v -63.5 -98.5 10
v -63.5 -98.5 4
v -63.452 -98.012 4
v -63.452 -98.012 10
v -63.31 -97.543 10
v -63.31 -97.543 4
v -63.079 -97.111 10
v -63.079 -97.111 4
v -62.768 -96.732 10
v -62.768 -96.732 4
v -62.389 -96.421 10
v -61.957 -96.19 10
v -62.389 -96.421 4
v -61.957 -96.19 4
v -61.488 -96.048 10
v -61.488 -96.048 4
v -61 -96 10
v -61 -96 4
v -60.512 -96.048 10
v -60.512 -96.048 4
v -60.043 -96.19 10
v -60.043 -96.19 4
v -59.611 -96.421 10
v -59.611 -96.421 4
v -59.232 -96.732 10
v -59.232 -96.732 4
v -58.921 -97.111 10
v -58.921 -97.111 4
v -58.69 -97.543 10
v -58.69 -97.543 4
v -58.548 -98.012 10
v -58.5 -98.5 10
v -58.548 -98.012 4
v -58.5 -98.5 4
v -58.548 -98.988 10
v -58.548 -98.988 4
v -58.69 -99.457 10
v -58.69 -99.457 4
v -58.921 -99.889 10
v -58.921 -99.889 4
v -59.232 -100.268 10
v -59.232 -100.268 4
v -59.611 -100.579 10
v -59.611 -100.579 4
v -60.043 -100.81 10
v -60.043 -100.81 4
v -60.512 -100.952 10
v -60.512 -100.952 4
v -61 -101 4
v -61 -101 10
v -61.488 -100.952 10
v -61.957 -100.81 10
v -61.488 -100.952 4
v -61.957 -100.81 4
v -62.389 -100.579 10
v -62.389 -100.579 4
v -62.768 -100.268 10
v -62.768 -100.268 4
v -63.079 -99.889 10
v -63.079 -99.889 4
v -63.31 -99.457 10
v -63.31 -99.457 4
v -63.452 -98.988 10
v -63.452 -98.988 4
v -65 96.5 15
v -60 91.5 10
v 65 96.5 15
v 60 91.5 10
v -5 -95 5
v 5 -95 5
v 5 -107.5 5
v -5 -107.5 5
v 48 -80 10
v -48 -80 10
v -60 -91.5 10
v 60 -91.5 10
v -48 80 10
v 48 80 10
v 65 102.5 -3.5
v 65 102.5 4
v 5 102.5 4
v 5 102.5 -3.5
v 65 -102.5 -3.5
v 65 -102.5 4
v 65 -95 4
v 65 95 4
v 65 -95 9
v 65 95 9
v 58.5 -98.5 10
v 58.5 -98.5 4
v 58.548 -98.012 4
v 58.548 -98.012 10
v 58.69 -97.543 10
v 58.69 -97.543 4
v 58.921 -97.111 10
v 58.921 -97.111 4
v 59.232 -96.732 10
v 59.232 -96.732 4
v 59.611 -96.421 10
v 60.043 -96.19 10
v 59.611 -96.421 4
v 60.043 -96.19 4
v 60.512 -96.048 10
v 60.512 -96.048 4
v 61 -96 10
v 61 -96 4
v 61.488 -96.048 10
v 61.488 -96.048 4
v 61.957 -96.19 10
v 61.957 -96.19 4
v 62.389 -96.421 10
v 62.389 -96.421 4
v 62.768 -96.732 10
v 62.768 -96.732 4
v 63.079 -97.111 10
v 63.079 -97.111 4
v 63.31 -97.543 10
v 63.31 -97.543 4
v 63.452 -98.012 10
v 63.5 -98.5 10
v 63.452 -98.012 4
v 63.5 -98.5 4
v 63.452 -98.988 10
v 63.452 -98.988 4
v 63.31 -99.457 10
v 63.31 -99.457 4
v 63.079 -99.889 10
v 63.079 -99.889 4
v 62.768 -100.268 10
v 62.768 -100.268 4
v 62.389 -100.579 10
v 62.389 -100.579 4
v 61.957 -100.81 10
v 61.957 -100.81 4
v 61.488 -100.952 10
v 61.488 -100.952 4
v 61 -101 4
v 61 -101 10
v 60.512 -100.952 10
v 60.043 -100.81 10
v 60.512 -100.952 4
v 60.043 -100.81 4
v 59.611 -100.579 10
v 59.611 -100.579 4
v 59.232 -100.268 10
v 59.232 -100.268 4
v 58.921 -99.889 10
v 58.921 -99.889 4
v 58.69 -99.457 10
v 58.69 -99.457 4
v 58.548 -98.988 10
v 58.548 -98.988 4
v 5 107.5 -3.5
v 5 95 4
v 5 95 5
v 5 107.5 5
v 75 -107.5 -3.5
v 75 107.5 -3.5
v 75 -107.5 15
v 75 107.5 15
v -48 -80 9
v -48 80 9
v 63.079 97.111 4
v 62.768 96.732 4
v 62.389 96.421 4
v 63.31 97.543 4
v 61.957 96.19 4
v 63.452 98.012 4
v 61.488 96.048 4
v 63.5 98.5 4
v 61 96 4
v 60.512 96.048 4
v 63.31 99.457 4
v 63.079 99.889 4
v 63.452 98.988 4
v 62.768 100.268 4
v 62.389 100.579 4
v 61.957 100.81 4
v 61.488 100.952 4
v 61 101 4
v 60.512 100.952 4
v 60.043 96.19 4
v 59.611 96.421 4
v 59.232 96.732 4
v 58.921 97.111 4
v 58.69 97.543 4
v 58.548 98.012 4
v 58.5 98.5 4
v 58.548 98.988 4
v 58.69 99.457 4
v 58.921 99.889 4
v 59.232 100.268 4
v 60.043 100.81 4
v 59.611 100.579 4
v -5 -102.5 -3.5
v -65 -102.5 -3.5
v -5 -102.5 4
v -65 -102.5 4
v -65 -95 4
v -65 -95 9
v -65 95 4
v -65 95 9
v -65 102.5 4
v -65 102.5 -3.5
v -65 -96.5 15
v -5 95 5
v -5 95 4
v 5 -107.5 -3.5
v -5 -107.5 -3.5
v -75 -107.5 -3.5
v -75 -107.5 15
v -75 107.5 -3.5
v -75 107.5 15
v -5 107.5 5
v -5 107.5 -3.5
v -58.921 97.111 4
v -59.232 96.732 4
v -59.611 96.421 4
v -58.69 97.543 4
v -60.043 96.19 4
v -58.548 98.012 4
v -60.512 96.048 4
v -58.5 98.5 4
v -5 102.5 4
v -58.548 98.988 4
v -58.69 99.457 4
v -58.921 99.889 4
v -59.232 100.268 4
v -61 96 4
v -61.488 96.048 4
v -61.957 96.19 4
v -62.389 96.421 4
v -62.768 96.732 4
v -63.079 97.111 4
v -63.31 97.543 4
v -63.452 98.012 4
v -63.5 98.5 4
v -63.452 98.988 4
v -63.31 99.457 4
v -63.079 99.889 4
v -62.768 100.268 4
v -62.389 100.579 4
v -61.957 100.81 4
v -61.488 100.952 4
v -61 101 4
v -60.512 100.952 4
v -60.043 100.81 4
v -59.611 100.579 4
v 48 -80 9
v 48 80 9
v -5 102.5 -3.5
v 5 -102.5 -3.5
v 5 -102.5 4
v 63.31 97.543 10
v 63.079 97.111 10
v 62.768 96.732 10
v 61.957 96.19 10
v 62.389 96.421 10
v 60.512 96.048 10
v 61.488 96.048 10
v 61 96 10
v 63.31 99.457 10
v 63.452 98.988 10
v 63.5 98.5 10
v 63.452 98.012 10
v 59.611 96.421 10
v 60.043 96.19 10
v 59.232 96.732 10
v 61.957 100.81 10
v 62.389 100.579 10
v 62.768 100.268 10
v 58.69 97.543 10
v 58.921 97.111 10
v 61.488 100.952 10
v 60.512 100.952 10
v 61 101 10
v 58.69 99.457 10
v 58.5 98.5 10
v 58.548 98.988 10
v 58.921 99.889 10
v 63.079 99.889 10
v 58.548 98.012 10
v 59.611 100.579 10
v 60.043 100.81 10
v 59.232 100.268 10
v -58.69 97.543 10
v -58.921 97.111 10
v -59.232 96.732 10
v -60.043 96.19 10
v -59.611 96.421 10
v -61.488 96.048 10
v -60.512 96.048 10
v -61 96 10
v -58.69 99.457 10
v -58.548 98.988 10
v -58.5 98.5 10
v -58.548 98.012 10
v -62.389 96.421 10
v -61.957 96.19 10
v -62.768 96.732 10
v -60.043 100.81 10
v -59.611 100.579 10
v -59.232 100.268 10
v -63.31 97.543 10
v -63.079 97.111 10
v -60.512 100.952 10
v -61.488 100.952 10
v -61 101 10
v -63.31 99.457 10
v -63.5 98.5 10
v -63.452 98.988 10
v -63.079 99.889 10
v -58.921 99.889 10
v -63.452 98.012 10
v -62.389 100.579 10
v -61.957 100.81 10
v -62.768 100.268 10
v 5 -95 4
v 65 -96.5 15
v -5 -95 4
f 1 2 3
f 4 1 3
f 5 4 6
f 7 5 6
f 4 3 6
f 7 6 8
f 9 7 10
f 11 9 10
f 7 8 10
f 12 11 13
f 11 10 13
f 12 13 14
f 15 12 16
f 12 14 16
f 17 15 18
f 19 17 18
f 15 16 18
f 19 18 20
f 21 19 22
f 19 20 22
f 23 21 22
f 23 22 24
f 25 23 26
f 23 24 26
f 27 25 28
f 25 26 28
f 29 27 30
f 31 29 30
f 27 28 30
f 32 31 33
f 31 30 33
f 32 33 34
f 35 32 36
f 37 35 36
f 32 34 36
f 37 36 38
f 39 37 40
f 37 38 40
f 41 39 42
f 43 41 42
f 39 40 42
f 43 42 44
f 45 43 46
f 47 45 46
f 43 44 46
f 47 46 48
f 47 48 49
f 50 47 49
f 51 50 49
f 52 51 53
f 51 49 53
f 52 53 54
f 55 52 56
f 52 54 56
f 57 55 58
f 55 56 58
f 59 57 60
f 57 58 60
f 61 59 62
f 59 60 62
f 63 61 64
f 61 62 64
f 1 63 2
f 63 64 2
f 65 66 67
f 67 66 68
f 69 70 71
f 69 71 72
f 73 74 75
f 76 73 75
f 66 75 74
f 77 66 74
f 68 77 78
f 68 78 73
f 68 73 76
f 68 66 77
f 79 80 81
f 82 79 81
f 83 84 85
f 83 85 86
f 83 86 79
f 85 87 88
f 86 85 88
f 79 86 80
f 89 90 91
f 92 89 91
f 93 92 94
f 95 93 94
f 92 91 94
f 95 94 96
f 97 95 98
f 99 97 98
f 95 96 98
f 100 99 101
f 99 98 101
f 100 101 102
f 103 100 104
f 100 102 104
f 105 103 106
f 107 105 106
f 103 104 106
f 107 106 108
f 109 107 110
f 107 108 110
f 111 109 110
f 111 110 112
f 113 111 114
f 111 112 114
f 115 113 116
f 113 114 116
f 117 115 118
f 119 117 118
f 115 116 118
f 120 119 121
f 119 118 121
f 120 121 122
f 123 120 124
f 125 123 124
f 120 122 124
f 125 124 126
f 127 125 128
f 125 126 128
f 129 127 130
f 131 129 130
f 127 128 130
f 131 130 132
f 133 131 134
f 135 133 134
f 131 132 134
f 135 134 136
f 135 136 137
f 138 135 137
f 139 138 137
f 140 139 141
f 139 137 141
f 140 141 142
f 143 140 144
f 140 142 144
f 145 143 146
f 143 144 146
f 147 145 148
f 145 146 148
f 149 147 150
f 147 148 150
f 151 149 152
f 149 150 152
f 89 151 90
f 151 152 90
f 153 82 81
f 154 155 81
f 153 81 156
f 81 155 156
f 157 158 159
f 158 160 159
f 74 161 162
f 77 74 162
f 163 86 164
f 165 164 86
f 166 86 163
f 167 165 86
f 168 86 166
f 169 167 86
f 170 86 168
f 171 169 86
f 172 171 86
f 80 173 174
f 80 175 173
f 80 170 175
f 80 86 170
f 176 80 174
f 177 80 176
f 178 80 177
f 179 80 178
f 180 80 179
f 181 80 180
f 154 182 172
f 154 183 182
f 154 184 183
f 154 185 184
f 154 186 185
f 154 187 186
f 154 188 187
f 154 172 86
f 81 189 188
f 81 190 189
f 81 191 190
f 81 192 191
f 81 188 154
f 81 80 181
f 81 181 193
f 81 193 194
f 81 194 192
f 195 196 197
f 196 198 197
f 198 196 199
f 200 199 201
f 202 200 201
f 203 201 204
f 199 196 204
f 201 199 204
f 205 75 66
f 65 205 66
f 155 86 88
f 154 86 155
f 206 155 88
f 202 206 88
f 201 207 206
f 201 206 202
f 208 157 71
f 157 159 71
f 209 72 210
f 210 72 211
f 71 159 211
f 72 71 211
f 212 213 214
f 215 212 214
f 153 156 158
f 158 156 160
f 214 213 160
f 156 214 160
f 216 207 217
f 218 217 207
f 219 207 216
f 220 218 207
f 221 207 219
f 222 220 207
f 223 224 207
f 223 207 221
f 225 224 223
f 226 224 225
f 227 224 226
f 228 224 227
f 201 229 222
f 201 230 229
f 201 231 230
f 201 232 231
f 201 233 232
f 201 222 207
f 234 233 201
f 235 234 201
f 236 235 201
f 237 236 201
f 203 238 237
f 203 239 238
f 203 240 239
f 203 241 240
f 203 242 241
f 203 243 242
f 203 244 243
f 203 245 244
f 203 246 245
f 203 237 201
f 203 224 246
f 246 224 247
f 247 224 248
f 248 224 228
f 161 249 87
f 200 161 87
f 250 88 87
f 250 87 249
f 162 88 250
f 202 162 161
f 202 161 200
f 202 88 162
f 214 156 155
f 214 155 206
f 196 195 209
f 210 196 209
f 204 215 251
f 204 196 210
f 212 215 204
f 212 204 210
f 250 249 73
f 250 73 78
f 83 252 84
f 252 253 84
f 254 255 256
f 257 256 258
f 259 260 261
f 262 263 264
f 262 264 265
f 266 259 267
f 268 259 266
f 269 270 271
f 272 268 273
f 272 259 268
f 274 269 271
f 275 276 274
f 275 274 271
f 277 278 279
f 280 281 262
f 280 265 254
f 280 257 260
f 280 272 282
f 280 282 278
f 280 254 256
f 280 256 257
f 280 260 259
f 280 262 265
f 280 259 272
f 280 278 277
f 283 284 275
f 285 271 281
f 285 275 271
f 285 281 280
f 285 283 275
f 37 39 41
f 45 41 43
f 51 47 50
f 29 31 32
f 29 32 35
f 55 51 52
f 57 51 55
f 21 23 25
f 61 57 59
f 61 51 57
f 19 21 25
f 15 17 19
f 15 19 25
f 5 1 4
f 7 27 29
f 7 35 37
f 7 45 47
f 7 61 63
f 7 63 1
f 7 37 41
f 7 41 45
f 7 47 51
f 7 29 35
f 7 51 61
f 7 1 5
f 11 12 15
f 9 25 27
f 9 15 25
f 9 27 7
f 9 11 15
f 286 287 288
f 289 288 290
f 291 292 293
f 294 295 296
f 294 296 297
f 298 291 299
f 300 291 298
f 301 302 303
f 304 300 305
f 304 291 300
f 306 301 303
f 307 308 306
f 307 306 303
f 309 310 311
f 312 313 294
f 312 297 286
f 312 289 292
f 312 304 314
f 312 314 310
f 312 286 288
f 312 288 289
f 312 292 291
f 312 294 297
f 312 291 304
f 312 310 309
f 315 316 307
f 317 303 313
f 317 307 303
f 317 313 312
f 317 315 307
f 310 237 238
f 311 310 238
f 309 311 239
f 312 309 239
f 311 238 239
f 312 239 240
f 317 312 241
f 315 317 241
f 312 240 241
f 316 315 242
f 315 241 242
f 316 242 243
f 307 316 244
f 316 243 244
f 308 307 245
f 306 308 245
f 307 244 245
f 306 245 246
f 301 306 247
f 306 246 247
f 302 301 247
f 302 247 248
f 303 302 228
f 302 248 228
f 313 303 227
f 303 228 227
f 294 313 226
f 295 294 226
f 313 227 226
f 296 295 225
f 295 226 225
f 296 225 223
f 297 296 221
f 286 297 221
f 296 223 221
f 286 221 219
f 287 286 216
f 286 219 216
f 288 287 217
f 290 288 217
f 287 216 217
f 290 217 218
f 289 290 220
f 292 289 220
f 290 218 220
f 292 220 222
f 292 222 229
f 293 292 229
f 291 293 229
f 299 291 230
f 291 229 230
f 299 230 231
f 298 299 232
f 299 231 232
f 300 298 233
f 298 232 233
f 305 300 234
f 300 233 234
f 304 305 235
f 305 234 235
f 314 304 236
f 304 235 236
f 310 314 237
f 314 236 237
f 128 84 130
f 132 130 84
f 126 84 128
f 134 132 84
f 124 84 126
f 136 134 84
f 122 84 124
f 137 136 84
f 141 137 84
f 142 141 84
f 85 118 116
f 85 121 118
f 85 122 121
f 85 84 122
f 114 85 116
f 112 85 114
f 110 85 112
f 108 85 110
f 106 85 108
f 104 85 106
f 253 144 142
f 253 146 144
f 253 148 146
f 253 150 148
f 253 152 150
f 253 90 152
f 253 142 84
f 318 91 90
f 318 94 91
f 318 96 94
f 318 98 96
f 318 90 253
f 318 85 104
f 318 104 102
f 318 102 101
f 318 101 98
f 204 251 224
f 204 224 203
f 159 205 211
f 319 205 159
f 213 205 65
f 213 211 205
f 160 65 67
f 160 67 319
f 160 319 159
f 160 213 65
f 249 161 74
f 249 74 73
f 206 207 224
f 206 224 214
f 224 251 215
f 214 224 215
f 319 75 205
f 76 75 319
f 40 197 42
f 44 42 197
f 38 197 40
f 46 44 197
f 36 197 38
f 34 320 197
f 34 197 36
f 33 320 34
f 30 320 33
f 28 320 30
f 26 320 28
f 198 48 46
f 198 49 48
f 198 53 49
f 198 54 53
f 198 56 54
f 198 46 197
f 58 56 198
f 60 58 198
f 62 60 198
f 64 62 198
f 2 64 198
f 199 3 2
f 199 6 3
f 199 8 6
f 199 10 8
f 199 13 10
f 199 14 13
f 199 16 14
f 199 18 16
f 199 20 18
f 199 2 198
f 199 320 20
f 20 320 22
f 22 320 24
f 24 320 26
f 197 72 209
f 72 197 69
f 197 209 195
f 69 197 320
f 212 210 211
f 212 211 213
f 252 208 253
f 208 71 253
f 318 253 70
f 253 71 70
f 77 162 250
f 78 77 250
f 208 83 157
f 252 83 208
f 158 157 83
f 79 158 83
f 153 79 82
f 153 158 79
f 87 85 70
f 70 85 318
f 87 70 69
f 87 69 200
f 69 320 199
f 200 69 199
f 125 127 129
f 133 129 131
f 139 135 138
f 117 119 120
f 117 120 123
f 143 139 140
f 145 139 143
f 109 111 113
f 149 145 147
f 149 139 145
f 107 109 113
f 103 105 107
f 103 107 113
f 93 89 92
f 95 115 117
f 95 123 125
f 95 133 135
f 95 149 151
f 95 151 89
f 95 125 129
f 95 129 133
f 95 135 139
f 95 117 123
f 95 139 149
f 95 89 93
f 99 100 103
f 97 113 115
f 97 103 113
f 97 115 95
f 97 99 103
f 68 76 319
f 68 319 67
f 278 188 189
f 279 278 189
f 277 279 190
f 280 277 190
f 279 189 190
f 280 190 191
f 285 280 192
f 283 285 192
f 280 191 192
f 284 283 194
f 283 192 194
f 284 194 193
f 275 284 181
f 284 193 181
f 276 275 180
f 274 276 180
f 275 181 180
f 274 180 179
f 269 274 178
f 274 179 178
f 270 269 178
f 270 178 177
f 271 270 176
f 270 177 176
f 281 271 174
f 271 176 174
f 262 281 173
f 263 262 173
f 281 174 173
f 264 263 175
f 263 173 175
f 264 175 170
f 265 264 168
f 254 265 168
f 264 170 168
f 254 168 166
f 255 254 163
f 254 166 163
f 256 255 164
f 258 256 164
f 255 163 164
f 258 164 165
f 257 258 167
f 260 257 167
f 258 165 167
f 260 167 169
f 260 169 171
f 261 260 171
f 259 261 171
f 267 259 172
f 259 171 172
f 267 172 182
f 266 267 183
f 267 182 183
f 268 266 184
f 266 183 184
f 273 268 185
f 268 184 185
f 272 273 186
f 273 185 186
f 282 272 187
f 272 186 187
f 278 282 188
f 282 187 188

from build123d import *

# Parameters (mm, degrees)
SKETCH_1_W          = 150
SKETCH_1_H          = 215
SKETCH_1_W_2        = 96
SKETCH_1_H_2        = 160
EXTRUDE_1_DEPTH     = 15
SKETCH_2_W          = 120
SKETCH_2_H          = 183
CUT_EXTRUDE_1_DEPTH = 5
CHAMFER_1_SIZE      = 5
SKETCH_5_W          = 130
SKETCH_5_H          = 190
CUT_EXTRUDE_2_DEPTH = 9
SKETCH_9_W          = 130
SKETCH_9_H          = 205
CUT_EXTRUDE_6_DEPTH = 4
SKETCH_10_R         = 2.5
CUT_EXTRUDE_7_DEPTH = 6
SKETCH_11_W         = 10
SKETCH_11_H         = 215
CUT_EXTRUDE_8_DEPTH = 5
EXTRUDE_2_DEPTH     = 3.5


with BuildPart() as part:
    # 草图1 → 凸台-拉伸1 (new body)
    with BuildSketch(Plane.XY):
        Rectangle(SKETCH_1_W, SKETCH_1_H)
        Rectangle(SKETCH_1_W_2, SKETCH_1_H_2, mode=Mode.SUBTRACT)
    extrude(amount=EXTRUDE_1_DEPTH)

    # 草图2 → 切除-拉伸1 (cut)
    with BuildSketch(Plane.XY.offset(15)):
        Rectangle(SKETCH_2_W, SKETCH_2_H)
    extrude(amount=-CUT_EXTRUDE_1_DEPTH, mode=Mode.SUBTRACT)

    # 倒角1
    chamfer_1_edges = [part.edges().sort_by_distance(p)[0] for p in [
        (0, -91.5, 15),
        (60, 0, 15),
        (-60, 0, 15),
        (0, 91.5, 15),
    ]]
    chamfer(chamfer_1_edges, length=CHAMFER_1_SIZE - 0.0001)  # a hair under: the kernel refuses the full size

    # 草图5 → 切除-拉伸2 (cut)
    with BuildSketch(Plane(origin=(0, 0, 0), x_dir=(-1, 0, 0), z_dir=(0, 0, -1))):
        Rectangle(SKETCH_5_W, SKETCH_5_H)
    extrude(amount=-CUT_EXTRUDE_2_DEPTH, mode=Mode.SUBTRACT)

    # 草图9 → 切除-拉伸6 (cut)
    with BuildSketch(Plane(origin=(0, 0, 0), x_dir=(-1, 0, 0), z_dir=(0, 0, -1))):
        Rectangle(SKETCH_9_W, SKETCH_9_H)
    extrude(amount=-CUT_EXTRUDE_6_DEPTH, mode=Mode.SUBTRACT)

    # 草图10 → 切除-拉伸7 (cut)
    with BuildSketch(Plane(origin=(0, 0, 4), x_dir=(-1, 0, 0), z_dir=(0, 0, -1))):
        with Locations((61, 98.5)):
            Circle(SKETCH_10_R)
        with Locations((-61, 98.5)):
            Circle(SKETCH_10_R)
        with Locations((-61, -98.5)):
            Circle(SKETCH_10_R)
        with Locations((61, -98.5)):
            Circle(SKETCH_10_R)
    extrude(amount=-CUT_EXTRUDE_7_DEPTH, mode=Mode.SUBTRACT)

    # 草图11 → 切除-拉伸8 (cut)
    with BuildSketch(Plane(origin=(0, 0, 0), x_dir=(-1, 0, 0), z_dir=(0, 0, -1))):
        Rectangle(SKETCH_11_W, SKETCH_11_H)
    extrude(amount=-CUT_EXTRUDE_8_DEPTH, mode=Mode.SUBTRACT)

    # 草图12 → 凸台-拉伸2 (add)
    with BuildSketch(Plane(origin=(0, 0, 0), x_dir=(-1, 0, 0), z_dir=(0, 0, -1))):
        Polygon((-5, 107.5), (-75, 107.5), (-75, -107.5), (-5, -107.5), (-5, -102.5), (-65, -102.5), (-65, 102.5), (-5, 102.5), align=None)
        Polygon((5, -102.5), (5, -107.5), (75, -107.5), (75, 107.5), (5, 107.5), (5, 102.5), (65, 102.5), (65, -102.5), align=None)
    extrude(amount=EXTRUDE_2_DEPTH)


solid = part.part
